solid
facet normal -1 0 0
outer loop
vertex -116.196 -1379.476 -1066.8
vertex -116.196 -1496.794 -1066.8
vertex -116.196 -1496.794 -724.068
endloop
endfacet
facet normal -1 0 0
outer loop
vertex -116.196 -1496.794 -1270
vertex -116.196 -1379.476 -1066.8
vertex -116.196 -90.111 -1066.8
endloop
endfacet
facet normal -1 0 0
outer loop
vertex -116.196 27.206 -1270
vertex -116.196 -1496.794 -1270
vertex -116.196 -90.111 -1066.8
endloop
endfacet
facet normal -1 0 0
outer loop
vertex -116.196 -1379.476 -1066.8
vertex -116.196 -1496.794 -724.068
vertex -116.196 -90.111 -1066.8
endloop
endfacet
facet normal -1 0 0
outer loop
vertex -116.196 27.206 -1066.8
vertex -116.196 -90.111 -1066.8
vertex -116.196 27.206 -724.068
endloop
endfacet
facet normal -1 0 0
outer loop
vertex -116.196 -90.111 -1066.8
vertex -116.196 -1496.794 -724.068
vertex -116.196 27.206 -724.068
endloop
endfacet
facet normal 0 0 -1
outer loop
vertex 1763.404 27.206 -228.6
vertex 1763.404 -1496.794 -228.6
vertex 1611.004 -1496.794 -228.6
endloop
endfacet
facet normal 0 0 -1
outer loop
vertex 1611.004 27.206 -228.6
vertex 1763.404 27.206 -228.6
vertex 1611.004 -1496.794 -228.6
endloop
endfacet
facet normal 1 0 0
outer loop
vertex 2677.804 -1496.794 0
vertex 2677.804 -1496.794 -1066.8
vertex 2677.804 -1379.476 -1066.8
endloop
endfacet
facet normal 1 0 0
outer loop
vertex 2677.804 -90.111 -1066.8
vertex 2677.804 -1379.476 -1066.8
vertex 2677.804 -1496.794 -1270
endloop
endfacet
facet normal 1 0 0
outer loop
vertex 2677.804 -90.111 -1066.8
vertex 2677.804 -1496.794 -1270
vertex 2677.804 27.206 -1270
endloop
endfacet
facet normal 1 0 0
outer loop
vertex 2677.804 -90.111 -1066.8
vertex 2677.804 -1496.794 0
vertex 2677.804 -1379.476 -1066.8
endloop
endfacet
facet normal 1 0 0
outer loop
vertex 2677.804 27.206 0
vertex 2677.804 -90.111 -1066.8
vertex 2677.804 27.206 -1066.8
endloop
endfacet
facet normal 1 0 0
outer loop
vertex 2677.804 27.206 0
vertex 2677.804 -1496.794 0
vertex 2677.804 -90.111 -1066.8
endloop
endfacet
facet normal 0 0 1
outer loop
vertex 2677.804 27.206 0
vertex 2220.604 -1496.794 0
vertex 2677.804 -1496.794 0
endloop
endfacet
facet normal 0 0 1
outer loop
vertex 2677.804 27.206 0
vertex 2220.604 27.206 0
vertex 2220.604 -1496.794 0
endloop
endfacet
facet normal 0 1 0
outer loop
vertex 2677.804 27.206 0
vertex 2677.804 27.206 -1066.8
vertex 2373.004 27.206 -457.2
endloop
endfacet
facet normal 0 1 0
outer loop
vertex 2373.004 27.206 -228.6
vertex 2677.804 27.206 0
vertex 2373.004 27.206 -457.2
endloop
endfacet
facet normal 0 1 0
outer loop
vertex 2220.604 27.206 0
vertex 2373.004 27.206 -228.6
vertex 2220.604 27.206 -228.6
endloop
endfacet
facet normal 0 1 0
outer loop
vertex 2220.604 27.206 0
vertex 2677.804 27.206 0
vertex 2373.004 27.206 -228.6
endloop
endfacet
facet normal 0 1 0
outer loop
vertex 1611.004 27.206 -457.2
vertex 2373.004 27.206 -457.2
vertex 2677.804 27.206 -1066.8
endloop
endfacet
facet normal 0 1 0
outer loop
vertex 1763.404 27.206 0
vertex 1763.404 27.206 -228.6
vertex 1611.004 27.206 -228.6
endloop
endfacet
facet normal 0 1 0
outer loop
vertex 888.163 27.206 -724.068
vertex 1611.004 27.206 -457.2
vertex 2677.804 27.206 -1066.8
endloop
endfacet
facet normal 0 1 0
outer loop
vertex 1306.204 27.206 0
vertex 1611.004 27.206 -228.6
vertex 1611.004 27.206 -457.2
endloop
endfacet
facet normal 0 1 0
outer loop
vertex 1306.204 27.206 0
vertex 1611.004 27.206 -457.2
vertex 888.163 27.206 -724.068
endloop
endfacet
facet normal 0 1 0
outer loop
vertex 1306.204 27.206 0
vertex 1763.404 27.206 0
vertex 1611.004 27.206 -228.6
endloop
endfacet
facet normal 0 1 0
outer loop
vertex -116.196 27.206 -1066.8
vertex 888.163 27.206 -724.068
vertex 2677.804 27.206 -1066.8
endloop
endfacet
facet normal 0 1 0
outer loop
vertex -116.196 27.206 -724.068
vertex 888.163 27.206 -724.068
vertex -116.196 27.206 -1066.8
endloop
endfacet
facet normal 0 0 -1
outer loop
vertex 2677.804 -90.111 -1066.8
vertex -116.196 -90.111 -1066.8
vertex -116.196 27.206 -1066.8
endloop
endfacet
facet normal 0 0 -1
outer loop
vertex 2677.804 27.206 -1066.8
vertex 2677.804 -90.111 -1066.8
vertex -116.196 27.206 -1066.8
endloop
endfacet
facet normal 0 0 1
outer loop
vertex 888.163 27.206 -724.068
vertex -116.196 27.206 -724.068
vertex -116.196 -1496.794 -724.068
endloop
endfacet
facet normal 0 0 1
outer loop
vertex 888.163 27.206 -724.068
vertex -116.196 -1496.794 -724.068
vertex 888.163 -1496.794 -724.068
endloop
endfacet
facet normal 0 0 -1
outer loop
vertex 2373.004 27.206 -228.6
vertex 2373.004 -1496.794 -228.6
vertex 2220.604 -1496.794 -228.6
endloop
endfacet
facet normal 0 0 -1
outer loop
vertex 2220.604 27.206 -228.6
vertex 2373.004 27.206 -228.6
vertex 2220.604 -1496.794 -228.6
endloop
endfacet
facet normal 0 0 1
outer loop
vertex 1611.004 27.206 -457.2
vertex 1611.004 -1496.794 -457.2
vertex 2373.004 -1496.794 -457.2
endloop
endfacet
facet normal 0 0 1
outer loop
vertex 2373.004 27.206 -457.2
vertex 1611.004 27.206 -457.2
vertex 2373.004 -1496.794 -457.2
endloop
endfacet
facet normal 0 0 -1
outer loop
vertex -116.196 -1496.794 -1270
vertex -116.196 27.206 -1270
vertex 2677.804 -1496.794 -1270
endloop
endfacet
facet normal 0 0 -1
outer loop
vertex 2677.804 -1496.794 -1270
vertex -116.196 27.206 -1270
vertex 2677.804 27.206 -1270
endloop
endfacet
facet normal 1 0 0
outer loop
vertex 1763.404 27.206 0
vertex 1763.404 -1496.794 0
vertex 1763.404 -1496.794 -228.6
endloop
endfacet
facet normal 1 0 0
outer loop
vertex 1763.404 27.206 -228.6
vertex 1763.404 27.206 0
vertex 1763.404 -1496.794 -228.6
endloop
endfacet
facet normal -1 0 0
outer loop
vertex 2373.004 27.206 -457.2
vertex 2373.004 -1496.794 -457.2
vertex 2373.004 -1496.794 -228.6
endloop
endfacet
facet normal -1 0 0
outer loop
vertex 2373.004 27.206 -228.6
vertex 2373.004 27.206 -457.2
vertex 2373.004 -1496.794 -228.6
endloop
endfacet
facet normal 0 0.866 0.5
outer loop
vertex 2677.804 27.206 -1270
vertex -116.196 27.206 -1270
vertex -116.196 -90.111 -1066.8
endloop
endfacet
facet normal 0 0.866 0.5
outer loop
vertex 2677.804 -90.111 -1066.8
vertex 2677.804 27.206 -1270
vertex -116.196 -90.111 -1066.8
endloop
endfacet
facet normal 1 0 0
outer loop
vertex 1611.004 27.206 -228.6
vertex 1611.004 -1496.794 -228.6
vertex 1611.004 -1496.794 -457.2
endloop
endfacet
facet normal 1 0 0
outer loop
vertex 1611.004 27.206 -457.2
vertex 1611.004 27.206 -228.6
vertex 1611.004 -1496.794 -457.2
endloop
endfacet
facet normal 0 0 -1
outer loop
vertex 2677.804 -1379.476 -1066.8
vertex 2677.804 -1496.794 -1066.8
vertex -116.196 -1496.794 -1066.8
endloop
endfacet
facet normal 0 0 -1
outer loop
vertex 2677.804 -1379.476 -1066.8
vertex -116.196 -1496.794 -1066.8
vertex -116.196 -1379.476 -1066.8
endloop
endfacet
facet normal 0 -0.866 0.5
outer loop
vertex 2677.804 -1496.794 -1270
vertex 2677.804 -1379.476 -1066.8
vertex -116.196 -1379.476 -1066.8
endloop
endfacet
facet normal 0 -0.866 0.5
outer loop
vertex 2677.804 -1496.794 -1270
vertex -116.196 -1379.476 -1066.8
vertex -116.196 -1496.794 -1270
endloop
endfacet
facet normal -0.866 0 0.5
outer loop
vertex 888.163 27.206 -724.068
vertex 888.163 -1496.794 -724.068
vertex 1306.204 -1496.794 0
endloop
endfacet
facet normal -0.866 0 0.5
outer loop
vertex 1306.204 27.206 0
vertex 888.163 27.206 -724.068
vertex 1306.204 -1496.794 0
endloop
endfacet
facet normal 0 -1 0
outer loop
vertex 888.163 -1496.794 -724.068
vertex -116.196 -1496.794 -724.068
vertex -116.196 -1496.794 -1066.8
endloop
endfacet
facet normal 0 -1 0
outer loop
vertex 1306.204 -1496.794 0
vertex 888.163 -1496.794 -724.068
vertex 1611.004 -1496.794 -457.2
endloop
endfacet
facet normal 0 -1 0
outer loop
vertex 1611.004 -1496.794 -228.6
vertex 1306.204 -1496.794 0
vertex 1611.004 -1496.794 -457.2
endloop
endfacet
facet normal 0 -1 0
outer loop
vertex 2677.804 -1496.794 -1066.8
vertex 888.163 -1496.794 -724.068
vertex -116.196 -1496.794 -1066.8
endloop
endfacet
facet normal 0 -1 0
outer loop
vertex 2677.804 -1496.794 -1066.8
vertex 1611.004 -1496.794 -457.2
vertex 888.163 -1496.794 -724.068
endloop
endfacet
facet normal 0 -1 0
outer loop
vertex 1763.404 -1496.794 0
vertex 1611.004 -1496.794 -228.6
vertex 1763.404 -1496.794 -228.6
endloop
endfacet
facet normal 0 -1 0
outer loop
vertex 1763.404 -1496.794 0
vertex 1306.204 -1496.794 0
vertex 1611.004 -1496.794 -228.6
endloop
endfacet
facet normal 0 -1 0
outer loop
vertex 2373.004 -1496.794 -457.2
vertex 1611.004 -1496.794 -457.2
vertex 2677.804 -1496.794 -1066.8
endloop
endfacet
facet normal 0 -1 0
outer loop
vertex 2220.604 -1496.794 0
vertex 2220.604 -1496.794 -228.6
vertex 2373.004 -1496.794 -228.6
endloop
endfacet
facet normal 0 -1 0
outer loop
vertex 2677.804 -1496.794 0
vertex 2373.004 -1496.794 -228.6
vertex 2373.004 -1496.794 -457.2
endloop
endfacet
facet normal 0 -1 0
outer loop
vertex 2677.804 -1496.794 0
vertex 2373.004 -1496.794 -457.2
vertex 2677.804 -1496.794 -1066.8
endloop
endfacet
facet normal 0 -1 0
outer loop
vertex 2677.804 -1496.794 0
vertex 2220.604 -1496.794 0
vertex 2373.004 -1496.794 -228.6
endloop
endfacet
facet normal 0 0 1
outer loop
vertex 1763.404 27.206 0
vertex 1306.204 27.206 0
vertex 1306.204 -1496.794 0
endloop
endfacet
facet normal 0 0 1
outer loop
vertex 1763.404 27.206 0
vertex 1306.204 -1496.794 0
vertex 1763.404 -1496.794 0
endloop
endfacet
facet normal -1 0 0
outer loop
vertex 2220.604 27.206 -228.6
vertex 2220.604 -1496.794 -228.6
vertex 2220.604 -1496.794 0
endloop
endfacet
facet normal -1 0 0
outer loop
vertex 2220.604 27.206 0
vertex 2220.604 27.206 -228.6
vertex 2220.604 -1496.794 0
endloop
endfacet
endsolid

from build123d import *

# Parameters (mm, degrees)
F0_W     = 457.2
F0_H     = 1524
F0_W_2   = 1422.4
F1_DEPTH = 1270
F3_DEPTH = 1524.001
F5_DEPTH = 2794.001
F6_DEPTH = 2794.001
F8_DEPTH = 1524.001


with BuildPart() as f1:
    # F0 (on Top) → F1 (new body)
    with BuildSketch(Plane.XY):
        with Locations((2449.204493, -734.793674)):
            Rectangle(F0_W, F0_H)
        with Locations((1992.004493, -734.793674)):
            Rectangle(F0_W, F0_H)
        with Locations((1534.804493, -734.793674)):
            Rectangle(F0_W, F0_H)
        with Locations((595.004493, -734.793674)):
            Rectangle(F0_W_2, F0_H)
    extrude(amount=-F1_DEPTH)

    # F2 (on face) → F3 (cut, through all)
    with BuildSketch(Plane.XZ.offset(1496.793674)):
        Polygon((2220.604493, -228.6), (2220.604493, 0), (1763.404493, 0), (1763.404493, -228.6), (1611.004493, -228.6), (1611.004493, -457.2), (2373.004493, -457.2), (2373.004493, -228.6), align=None)
    extrude(amount=-F3_DEPTH, mode=Mode.SUBTRACT)

    # F4 (on face) → F5 (cut, through all)
    with BuildSketch(Plane(origin=(-116.195507, 0, 0), x_dir=(0, -1, 0), z_dir=(-1, 0, 0))):
        Polygon((-27.206326, -1066.8), (-27.206326, -1270), (90.111249, -1066.8), align=None)
    extrude(amount=-F5_DEPTH, mode=Mode.SUBTRACT)

    # F4 (on face) → F6 (cut, through all)
    with BuildSketch(Plane(origin=(-116.195507, 0, 0), x_dir=(0, -1, 0), z_dir=(-1, 0, 0))):
        Polygon((1379.476099, -1066.8), (1496.793674, -1270), (1496.793674, -1066.8), align=None)
    extrude(amount=-F6_DEPTH, mode=Mode.SUBTRACT)

    # F7 (on face) → F8 (cut, through all)
    with BuildSketch(Plane.XZ.offset(1496.793674)):
        Polygon((888.163439, -724.068344), (1306.204493, 0), (-116.195507, 0), (-116.195507, -724.068344), align=None)
    extrude(amount=-F8_DEPTH, mode=Mode.SUBTRACT)


solid = f1.part
